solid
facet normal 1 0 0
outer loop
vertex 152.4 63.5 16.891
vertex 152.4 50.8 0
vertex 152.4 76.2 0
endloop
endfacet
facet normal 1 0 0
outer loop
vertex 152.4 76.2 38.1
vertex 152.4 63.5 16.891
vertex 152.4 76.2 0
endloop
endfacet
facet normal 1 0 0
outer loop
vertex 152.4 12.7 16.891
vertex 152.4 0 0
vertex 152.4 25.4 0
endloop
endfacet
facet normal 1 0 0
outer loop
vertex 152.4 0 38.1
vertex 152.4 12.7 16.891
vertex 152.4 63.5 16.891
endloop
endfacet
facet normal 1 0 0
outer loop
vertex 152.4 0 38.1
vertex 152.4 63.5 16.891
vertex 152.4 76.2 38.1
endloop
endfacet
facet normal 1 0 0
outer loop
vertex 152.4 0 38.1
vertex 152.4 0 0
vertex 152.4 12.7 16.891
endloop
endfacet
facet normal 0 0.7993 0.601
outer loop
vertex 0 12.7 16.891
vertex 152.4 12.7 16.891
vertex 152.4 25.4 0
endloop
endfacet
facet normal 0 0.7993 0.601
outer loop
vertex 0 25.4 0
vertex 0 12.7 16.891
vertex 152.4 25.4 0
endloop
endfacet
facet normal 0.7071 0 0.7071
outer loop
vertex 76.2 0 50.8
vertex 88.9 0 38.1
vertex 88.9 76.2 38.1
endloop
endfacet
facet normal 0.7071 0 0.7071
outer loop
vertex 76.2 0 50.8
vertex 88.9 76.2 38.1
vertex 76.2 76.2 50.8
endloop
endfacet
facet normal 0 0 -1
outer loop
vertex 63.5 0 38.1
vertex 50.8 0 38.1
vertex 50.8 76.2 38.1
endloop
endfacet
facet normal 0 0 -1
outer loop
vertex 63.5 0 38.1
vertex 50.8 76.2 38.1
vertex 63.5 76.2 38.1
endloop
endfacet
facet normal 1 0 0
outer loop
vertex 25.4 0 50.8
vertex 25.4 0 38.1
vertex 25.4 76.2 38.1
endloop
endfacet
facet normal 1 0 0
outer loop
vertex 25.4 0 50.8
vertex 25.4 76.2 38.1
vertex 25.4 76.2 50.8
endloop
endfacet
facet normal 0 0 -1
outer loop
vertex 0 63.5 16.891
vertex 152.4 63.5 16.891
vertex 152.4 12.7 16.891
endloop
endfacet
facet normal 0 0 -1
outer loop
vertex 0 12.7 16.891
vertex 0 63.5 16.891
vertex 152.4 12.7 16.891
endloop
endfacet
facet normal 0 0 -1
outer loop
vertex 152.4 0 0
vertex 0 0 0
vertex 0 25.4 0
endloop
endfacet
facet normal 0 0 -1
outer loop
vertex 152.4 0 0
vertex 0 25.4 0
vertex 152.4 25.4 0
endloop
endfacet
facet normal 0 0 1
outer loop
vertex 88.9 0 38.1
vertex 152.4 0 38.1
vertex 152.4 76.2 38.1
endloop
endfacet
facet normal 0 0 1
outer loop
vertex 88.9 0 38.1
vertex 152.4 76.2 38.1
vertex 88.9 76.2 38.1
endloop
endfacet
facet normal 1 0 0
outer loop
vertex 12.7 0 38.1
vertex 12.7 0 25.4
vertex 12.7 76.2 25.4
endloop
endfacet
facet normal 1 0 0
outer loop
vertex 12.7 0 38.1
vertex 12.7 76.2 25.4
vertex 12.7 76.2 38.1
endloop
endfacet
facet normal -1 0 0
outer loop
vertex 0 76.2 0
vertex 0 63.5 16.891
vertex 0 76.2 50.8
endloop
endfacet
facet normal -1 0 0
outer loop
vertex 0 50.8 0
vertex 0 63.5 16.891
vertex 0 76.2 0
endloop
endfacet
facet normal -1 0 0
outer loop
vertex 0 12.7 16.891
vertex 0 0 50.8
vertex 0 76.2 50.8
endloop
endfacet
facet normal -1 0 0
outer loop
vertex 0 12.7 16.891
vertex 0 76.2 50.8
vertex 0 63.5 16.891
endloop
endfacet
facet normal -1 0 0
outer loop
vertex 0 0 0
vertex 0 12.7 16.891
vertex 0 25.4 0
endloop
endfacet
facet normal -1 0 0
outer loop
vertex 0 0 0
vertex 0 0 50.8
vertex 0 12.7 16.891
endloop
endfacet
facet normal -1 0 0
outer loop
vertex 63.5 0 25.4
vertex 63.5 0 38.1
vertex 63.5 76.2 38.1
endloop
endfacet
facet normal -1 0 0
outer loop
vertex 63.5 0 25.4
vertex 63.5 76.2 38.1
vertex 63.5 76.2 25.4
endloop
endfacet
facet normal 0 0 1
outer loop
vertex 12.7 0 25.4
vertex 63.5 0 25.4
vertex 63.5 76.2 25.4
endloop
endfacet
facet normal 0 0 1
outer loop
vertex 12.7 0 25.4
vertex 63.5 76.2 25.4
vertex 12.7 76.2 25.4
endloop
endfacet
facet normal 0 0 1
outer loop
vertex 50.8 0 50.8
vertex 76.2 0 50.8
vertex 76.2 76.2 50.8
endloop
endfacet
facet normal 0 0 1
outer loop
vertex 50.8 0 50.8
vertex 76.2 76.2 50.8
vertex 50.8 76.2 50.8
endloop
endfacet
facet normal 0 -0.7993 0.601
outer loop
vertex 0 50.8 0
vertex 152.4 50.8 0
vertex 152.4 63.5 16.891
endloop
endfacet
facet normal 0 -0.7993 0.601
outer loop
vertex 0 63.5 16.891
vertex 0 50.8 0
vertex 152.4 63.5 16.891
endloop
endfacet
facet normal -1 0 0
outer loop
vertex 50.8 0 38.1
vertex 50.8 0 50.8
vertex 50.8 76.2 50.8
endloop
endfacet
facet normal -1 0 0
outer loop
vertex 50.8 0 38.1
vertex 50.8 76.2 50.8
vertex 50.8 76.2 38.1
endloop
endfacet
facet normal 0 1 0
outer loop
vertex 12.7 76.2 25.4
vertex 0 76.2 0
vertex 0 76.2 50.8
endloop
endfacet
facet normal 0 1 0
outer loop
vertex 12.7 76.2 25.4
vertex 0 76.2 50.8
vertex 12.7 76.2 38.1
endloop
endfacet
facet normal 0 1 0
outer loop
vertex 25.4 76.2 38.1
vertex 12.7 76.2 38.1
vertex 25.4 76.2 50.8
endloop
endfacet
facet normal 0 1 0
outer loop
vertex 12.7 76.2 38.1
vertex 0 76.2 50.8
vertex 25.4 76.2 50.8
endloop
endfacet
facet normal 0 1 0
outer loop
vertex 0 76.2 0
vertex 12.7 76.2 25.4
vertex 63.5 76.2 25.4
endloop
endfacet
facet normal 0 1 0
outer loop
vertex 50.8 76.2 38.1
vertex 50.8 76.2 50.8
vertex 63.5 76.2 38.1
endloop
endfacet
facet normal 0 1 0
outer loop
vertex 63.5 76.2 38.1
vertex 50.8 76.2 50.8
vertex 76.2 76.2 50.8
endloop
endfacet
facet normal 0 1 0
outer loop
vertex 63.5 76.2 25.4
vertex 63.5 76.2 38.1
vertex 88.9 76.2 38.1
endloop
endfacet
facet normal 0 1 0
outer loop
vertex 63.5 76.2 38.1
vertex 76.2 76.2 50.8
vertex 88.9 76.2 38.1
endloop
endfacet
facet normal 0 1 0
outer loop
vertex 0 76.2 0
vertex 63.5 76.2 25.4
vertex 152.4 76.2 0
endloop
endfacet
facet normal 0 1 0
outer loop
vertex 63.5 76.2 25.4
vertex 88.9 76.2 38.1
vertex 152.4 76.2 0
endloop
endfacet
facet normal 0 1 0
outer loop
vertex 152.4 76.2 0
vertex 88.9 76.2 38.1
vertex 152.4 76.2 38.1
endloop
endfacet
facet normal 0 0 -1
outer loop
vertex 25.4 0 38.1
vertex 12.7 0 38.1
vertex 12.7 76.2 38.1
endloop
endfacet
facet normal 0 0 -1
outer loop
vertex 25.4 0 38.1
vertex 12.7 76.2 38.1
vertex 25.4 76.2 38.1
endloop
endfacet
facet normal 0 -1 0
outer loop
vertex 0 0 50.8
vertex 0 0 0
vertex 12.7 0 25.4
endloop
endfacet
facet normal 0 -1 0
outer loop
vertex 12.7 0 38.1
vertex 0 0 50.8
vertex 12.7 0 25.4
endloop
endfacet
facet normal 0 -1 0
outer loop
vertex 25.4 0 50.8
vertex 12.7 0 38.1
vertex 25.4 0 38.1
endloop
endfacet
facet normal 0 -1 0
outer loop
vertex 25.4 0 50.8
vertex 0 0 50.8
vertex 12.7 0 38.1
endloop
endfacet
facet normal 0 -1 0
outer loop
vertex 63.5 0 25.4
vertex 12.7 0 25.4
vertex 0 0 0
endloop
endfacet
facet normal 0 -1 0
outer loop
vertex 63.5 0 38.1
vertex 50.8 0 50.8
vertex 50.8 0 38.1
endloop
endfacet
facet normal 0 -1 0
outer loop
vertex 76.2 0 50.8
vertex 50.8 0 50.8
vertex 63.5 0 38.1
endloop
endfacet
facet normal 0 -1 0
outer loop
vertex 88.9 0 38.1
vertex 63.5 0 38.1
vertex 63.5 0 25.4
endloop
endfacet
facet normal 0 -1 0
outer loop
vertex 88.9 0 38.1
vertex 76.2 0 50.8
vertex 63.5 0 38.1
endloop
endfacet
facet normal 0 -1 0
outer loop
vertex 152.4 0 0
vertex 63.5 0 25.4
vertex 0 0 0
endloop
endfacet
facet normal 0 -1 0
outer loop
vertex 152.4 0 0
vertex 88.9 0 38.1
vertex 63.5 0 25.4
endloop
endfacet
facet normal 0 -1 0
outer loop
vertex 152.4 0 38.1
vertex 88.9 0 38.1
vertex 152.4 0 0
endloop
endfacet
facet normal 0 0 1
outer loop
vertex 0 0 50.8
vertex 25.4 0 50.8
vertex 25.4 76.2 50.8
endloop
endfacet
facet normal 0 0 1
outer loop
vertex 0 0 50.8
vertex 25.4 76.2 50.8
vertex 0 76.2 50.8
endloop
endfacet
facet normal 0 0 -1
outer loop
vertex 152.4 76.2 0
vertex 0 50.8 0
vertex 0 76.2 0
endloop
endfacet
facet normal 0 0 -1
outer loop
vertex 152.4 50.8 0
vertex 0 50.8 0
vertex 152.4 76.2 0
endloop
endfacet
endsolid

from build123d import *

# Parameters (mm, degrees)
F1_DEPTH = 76.2
F3_DEPTH = 152.4
F5_DEPTH = 152.4
F7_DEPTH = 152.4


with BuildPart() as f1:
    # F0 (on Front) → F1 (new body)
    with BuildSketch(Plane.XZ):
        Polygon((152.4, 38.1), (88.9, 38.1), (76.2, 50.8), (50.8, 50.8), (50.8, 38.1), (63.5, 38.1), (63.5, 25.4), (12.7, 25.4), (12.7, 38.1), (25.4, 38.1), (25.4, 50.8), (0, 50.8), (0, 0), (152.4, 0), align=None)
    extrude(amount=-F1_DEPTH)

    # F2 (on Right) → F3 (join)
    with BuildSketch(Plane.YZ):
        Polygon((12.7, 12.7), (25.4, 0), (50.8, 0), (63.5, 12.7), align=None)
    extrude(amount=F3_DEPTH)

    # F4 (on face) → F5 (join)
    with BuildSketch(Plane.YZ.offset(152.4)):
        Polygon((12.7, 11.3952), (25.4, 0), (50.8, 0), (63.5, 11.3952), align=None)
    extrude(amount=-F5_DEPTH)

    # F6 (on face) → F7 (cut)
    with BuildSketch(Plane.YZ.offset(152.4)):
        Polygon((12.7, 16.891001), (25.4, 0), (50.8, 0), (63.5, 16.891001), align=None)
    extrude(amount=-F7_DEPTH, mode=Mode.SUBTRACT)


solid = f1.part
